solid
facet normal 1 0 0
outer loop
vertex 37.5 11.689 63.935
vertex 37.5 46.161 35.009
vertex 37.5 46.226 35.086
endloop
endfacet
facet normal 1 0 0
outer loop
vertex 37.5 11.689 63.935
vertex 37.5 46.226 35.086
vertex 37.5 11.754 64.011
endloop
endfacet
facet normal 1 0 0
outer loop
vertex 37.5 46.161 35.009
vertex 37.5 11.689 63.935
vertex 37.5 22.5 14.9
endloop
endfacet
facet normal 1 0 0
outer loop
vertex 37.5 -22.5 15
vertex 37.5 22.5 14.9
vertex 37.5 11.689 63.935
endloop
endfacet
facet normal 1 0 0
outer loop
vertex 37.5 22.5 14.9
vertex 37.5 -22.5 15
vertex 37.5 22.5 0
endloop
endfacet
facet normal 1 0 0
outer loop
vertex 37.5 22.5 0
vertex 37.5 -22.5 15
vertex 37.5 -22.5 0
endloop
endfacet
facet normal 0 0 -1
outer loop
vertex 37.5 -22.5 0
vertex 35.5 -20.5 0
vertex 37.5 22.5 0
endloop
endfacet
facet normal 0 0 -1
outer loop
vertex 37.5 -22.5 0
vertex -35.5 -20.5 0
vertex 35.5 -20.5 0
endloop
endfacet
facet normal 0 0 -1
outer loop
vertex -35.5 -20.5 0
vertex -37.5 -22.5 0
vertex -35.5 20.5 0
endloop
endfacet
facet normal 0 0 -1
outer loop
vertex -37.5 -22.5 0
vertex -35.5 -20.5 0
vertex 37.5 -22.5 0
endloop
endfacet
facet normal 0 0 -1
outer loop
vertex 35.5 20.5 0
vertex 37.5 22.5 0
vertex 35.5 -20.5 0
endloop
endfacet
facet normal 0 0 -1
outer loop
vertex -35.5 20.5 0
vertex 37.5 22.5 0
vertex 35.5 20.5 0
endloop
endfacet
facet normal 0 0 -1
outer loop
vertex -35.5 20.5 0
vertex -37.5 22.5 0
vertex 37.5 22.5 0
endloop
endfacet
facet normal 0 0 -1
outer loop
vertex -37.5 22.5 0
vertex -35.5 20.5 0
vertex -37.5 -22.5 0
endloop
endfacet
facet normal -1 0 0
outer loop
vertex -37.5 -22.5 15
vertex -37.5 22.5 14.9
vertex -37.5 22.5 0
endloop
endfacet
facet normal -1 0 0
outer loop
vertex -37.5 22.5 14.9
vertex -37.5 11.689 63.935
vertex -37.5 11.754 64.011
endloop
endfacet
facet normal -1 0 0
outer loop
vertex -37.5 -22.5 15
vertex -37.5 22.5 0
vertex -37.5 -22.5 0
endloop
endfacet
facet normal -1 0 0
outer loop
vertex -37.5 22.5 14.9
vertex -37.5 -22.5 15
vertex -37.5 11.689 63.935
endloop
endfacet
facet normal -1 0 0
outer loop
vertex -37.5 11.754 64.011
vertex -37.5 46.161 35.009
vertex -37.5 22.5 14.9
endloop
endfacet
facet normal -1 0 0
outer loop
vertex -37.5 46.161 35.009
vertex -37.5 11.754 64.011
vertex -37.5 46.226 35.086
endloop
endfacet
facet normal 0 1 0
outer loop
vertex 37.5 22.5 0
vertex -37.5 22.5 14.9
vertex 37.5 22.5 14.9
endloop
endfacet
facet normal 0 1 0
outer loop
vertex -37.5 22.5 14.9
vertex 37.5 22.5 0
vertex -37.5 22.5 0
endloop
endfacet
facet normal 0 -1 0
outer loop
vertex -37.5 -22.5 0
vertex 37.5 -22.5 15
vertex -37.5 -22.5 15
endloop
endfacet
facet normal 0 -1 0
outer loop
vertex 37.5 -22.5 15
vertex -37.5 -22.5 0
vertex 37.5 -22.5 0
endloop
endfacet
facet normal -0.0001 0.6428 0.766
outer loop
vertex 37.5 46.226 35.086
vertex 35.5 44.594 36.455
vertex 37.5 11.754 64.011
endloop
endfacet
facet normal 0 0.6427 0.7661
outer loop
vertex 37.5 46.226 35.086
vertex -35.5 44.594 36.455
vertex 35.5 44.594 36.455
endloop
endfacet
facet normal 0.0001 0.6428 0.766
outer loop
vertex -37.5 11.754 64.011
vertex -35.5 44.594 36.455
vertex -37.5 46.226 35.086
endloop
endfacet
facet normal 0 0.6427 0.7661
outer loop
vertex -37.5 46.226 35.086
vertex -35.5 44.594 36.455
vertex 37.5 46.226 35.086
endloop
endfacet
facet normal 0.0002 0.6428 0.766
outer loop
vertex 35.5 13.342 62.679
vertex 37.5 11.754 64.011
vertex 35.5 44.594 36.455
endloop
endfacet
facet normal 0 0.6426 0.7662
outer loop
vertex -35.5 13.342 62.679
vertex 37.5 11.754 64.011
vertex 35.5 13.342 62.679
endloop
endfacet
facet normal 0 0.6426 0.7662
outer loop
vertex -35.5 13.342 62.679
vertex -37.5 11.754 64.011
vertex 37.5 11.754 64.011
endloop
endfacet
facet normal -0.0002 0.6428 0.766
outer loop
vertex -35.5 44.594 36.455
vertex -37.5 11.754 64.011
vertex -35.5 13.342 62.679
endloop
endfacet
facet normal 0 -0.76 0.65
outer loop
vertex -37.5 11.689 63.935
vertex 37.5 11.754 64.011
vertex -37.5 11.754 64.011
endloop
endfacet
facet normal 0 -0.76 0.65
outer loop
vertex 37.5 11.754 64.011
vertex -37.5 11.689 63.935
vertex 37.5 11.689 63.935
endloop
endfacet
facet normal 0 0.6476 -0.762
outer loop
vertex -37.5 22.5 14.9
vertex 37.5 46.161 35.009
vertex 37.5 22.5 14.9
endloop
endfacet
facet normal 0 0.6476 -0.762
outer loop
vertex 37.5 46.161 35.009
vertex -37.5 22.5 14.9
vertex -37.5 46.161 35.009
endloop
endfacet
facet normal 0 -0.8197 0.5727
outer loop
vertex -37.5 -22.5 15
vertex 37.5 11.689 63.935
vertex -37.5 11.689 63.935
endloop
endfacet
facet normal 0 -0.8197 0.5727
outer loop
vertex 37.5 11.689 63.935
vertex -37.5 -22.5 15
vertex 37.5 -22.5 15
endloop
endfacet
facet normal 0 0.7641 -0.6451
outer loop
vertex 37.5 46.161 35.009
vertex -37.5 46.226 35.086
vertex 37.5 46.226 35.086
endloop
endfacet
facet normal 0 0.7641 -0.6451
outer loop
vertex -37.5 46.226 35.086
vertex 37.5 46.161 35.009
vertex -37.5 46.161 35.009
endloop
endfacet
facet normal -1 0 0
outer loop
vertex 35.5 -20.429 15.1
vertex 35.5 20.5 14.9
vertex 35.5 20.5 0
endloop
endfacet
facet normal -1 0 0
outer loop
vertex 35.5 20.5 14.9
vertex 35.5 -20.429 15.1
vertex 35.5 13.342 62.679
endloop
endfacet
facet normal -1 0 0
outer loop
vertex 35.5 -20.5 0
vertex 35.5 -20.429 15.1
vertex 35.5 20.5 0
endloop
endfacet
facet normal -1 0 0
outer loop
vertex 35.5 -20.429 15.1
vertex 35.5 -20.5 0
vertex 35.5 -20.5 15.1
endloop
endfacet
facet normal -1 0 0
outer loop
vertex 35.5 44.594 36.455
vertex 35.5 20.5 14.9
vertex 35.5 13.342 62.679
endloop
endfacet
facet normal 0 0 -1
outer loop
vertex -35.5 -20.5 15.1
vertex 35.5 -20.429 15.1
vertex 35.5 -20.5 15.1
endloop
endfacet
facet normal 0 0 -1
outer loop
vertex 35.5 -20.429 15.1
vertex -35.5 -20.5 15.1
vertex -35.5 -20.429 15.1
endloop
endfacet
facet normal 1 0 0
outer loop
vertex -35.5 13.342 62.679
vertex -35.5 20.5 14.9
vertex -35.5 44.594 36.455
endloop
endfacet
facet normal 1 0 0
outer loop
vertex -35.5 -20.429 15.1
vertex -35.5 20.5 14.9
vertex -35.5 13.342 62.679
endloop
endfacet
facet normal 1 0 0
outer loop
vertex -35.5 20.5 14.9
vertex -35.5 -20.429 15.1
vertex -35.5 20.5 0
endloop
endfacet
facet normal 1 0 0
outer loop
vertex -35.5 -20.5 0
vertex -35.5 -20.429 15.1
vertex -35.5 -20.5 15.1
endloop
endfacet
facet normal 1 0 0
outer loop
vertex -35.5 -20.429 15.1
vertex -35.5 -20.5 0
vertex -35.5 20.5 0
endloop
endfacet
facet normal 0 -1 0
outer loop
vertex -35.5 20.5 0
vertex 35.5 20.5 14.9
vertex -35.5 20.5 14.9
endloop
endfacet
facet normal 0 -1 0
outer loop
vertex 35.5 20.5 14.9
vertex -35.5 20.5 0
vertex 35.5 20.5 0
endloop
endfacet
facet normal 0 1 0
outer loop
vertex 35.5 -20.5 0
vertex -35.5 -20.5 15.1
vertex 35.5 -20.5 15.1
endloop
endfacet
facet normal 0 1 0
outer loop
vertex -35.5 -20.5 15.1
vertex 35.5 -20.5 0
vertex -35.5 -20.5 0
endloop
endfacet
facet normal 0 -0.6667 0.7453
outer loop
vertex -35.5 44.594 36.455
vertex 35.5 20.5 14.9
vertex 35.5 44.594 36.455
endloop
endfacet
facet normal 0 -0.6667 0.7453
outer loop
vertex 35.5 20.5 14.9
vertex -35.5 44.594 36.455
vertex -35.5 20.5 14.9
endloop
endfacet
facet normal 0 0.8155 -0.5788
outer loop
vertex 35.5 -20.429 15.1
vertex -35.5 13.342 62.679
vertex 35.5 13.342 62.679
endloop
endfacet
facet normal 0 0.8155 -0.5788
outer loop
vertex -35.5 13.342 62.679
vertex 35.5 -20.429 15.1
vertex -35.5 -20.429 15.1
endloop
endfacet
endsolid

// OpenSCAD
// 2015-2025 Ford F-150 Rear Console A/C Vent Deflector
// Parametric configuration

/* [Dimensions] */
// Width of the factory vent opening (measure the inside lip)
vent_width = 75.0;

// Height of the factory vent opening
vent_height = 45.0;

// How deep the friction-fit sleeve goes into the vent
insert_depth = 15.0;

// Wall thickness of the printed part
wall_thickness = 2.0;

// Angle of the upward scoop (Degrees)
scoop_angle = 40.0;

// How far the scoop extends out from the console
scoop_length = 45.0;

/* [Hidden] */
$fn = 60;

module deflector() {
    difference() {
        // --- OUTER SHELL ---
        union() {
            // 1. The straight insert (slides into the console)
            translate([-vent_width/2, -vent_height/2, 0])
                cube([vent_width, vent_height, insert_depth]);

            // 2. The angled scoop (Smoothly hulls from the insert to the new angle)
            hull() {
                // Base of the scoop (matches the end of the insert)
                translate([-vent_width/2, -vent_height/2, insert_depth - 0.1])
                    cube([vent_width, vent_height, 0.1]);

                // Top of the scoop (rotated upward)
                translate([0, 0, insert_depth])
                    rotate([-scoop_angle, 0, 0])
                    translate([-vent_width/2, -vent_height/2, scoop_length])
                    cube([vent_width, vent_height, 0.1]);
            }
        }

        // --- INNER SHELL SUBTRACTION (Hollows it out) ---
        union() {
            // 3. Hollow out the straight insert
            translate([-(vent_width - 2*wall_thickness)/2, -(vent_height - 2*wall_thickness)/2, -1])
                cube([vent_width - 2*wall_thickness, vent_height - 2*wall_thickness, insert_depth + 1.1]);

            // 4. Hollow out the angled scoop
            hull() {
                translate([-(vent_width - 2*wall_thickness)/2, -(vent_height - 2*wall_thickness)/2, insert_depth - 0.1])
                    cube([vent_width - 2*wall_thickness, vent_height - 2*wall_thickness, 0.1]);

                translate([0, 0, insert_depth])
                    rotate([-scoop_angle, 0, 0])
                    translate([-(vent_width - 2*wall_thickness)/2, -(vent_height - 2*wall_thickness)/2, scoop_length + 1])
                    cube([vent_width - 2*wall_thickness, vent_height - 2*wall_thickness, 0.1]);
            }
        }
    }
}

// Generate the part (Sitting flat on the insert base for support-free printing)
deflector();
